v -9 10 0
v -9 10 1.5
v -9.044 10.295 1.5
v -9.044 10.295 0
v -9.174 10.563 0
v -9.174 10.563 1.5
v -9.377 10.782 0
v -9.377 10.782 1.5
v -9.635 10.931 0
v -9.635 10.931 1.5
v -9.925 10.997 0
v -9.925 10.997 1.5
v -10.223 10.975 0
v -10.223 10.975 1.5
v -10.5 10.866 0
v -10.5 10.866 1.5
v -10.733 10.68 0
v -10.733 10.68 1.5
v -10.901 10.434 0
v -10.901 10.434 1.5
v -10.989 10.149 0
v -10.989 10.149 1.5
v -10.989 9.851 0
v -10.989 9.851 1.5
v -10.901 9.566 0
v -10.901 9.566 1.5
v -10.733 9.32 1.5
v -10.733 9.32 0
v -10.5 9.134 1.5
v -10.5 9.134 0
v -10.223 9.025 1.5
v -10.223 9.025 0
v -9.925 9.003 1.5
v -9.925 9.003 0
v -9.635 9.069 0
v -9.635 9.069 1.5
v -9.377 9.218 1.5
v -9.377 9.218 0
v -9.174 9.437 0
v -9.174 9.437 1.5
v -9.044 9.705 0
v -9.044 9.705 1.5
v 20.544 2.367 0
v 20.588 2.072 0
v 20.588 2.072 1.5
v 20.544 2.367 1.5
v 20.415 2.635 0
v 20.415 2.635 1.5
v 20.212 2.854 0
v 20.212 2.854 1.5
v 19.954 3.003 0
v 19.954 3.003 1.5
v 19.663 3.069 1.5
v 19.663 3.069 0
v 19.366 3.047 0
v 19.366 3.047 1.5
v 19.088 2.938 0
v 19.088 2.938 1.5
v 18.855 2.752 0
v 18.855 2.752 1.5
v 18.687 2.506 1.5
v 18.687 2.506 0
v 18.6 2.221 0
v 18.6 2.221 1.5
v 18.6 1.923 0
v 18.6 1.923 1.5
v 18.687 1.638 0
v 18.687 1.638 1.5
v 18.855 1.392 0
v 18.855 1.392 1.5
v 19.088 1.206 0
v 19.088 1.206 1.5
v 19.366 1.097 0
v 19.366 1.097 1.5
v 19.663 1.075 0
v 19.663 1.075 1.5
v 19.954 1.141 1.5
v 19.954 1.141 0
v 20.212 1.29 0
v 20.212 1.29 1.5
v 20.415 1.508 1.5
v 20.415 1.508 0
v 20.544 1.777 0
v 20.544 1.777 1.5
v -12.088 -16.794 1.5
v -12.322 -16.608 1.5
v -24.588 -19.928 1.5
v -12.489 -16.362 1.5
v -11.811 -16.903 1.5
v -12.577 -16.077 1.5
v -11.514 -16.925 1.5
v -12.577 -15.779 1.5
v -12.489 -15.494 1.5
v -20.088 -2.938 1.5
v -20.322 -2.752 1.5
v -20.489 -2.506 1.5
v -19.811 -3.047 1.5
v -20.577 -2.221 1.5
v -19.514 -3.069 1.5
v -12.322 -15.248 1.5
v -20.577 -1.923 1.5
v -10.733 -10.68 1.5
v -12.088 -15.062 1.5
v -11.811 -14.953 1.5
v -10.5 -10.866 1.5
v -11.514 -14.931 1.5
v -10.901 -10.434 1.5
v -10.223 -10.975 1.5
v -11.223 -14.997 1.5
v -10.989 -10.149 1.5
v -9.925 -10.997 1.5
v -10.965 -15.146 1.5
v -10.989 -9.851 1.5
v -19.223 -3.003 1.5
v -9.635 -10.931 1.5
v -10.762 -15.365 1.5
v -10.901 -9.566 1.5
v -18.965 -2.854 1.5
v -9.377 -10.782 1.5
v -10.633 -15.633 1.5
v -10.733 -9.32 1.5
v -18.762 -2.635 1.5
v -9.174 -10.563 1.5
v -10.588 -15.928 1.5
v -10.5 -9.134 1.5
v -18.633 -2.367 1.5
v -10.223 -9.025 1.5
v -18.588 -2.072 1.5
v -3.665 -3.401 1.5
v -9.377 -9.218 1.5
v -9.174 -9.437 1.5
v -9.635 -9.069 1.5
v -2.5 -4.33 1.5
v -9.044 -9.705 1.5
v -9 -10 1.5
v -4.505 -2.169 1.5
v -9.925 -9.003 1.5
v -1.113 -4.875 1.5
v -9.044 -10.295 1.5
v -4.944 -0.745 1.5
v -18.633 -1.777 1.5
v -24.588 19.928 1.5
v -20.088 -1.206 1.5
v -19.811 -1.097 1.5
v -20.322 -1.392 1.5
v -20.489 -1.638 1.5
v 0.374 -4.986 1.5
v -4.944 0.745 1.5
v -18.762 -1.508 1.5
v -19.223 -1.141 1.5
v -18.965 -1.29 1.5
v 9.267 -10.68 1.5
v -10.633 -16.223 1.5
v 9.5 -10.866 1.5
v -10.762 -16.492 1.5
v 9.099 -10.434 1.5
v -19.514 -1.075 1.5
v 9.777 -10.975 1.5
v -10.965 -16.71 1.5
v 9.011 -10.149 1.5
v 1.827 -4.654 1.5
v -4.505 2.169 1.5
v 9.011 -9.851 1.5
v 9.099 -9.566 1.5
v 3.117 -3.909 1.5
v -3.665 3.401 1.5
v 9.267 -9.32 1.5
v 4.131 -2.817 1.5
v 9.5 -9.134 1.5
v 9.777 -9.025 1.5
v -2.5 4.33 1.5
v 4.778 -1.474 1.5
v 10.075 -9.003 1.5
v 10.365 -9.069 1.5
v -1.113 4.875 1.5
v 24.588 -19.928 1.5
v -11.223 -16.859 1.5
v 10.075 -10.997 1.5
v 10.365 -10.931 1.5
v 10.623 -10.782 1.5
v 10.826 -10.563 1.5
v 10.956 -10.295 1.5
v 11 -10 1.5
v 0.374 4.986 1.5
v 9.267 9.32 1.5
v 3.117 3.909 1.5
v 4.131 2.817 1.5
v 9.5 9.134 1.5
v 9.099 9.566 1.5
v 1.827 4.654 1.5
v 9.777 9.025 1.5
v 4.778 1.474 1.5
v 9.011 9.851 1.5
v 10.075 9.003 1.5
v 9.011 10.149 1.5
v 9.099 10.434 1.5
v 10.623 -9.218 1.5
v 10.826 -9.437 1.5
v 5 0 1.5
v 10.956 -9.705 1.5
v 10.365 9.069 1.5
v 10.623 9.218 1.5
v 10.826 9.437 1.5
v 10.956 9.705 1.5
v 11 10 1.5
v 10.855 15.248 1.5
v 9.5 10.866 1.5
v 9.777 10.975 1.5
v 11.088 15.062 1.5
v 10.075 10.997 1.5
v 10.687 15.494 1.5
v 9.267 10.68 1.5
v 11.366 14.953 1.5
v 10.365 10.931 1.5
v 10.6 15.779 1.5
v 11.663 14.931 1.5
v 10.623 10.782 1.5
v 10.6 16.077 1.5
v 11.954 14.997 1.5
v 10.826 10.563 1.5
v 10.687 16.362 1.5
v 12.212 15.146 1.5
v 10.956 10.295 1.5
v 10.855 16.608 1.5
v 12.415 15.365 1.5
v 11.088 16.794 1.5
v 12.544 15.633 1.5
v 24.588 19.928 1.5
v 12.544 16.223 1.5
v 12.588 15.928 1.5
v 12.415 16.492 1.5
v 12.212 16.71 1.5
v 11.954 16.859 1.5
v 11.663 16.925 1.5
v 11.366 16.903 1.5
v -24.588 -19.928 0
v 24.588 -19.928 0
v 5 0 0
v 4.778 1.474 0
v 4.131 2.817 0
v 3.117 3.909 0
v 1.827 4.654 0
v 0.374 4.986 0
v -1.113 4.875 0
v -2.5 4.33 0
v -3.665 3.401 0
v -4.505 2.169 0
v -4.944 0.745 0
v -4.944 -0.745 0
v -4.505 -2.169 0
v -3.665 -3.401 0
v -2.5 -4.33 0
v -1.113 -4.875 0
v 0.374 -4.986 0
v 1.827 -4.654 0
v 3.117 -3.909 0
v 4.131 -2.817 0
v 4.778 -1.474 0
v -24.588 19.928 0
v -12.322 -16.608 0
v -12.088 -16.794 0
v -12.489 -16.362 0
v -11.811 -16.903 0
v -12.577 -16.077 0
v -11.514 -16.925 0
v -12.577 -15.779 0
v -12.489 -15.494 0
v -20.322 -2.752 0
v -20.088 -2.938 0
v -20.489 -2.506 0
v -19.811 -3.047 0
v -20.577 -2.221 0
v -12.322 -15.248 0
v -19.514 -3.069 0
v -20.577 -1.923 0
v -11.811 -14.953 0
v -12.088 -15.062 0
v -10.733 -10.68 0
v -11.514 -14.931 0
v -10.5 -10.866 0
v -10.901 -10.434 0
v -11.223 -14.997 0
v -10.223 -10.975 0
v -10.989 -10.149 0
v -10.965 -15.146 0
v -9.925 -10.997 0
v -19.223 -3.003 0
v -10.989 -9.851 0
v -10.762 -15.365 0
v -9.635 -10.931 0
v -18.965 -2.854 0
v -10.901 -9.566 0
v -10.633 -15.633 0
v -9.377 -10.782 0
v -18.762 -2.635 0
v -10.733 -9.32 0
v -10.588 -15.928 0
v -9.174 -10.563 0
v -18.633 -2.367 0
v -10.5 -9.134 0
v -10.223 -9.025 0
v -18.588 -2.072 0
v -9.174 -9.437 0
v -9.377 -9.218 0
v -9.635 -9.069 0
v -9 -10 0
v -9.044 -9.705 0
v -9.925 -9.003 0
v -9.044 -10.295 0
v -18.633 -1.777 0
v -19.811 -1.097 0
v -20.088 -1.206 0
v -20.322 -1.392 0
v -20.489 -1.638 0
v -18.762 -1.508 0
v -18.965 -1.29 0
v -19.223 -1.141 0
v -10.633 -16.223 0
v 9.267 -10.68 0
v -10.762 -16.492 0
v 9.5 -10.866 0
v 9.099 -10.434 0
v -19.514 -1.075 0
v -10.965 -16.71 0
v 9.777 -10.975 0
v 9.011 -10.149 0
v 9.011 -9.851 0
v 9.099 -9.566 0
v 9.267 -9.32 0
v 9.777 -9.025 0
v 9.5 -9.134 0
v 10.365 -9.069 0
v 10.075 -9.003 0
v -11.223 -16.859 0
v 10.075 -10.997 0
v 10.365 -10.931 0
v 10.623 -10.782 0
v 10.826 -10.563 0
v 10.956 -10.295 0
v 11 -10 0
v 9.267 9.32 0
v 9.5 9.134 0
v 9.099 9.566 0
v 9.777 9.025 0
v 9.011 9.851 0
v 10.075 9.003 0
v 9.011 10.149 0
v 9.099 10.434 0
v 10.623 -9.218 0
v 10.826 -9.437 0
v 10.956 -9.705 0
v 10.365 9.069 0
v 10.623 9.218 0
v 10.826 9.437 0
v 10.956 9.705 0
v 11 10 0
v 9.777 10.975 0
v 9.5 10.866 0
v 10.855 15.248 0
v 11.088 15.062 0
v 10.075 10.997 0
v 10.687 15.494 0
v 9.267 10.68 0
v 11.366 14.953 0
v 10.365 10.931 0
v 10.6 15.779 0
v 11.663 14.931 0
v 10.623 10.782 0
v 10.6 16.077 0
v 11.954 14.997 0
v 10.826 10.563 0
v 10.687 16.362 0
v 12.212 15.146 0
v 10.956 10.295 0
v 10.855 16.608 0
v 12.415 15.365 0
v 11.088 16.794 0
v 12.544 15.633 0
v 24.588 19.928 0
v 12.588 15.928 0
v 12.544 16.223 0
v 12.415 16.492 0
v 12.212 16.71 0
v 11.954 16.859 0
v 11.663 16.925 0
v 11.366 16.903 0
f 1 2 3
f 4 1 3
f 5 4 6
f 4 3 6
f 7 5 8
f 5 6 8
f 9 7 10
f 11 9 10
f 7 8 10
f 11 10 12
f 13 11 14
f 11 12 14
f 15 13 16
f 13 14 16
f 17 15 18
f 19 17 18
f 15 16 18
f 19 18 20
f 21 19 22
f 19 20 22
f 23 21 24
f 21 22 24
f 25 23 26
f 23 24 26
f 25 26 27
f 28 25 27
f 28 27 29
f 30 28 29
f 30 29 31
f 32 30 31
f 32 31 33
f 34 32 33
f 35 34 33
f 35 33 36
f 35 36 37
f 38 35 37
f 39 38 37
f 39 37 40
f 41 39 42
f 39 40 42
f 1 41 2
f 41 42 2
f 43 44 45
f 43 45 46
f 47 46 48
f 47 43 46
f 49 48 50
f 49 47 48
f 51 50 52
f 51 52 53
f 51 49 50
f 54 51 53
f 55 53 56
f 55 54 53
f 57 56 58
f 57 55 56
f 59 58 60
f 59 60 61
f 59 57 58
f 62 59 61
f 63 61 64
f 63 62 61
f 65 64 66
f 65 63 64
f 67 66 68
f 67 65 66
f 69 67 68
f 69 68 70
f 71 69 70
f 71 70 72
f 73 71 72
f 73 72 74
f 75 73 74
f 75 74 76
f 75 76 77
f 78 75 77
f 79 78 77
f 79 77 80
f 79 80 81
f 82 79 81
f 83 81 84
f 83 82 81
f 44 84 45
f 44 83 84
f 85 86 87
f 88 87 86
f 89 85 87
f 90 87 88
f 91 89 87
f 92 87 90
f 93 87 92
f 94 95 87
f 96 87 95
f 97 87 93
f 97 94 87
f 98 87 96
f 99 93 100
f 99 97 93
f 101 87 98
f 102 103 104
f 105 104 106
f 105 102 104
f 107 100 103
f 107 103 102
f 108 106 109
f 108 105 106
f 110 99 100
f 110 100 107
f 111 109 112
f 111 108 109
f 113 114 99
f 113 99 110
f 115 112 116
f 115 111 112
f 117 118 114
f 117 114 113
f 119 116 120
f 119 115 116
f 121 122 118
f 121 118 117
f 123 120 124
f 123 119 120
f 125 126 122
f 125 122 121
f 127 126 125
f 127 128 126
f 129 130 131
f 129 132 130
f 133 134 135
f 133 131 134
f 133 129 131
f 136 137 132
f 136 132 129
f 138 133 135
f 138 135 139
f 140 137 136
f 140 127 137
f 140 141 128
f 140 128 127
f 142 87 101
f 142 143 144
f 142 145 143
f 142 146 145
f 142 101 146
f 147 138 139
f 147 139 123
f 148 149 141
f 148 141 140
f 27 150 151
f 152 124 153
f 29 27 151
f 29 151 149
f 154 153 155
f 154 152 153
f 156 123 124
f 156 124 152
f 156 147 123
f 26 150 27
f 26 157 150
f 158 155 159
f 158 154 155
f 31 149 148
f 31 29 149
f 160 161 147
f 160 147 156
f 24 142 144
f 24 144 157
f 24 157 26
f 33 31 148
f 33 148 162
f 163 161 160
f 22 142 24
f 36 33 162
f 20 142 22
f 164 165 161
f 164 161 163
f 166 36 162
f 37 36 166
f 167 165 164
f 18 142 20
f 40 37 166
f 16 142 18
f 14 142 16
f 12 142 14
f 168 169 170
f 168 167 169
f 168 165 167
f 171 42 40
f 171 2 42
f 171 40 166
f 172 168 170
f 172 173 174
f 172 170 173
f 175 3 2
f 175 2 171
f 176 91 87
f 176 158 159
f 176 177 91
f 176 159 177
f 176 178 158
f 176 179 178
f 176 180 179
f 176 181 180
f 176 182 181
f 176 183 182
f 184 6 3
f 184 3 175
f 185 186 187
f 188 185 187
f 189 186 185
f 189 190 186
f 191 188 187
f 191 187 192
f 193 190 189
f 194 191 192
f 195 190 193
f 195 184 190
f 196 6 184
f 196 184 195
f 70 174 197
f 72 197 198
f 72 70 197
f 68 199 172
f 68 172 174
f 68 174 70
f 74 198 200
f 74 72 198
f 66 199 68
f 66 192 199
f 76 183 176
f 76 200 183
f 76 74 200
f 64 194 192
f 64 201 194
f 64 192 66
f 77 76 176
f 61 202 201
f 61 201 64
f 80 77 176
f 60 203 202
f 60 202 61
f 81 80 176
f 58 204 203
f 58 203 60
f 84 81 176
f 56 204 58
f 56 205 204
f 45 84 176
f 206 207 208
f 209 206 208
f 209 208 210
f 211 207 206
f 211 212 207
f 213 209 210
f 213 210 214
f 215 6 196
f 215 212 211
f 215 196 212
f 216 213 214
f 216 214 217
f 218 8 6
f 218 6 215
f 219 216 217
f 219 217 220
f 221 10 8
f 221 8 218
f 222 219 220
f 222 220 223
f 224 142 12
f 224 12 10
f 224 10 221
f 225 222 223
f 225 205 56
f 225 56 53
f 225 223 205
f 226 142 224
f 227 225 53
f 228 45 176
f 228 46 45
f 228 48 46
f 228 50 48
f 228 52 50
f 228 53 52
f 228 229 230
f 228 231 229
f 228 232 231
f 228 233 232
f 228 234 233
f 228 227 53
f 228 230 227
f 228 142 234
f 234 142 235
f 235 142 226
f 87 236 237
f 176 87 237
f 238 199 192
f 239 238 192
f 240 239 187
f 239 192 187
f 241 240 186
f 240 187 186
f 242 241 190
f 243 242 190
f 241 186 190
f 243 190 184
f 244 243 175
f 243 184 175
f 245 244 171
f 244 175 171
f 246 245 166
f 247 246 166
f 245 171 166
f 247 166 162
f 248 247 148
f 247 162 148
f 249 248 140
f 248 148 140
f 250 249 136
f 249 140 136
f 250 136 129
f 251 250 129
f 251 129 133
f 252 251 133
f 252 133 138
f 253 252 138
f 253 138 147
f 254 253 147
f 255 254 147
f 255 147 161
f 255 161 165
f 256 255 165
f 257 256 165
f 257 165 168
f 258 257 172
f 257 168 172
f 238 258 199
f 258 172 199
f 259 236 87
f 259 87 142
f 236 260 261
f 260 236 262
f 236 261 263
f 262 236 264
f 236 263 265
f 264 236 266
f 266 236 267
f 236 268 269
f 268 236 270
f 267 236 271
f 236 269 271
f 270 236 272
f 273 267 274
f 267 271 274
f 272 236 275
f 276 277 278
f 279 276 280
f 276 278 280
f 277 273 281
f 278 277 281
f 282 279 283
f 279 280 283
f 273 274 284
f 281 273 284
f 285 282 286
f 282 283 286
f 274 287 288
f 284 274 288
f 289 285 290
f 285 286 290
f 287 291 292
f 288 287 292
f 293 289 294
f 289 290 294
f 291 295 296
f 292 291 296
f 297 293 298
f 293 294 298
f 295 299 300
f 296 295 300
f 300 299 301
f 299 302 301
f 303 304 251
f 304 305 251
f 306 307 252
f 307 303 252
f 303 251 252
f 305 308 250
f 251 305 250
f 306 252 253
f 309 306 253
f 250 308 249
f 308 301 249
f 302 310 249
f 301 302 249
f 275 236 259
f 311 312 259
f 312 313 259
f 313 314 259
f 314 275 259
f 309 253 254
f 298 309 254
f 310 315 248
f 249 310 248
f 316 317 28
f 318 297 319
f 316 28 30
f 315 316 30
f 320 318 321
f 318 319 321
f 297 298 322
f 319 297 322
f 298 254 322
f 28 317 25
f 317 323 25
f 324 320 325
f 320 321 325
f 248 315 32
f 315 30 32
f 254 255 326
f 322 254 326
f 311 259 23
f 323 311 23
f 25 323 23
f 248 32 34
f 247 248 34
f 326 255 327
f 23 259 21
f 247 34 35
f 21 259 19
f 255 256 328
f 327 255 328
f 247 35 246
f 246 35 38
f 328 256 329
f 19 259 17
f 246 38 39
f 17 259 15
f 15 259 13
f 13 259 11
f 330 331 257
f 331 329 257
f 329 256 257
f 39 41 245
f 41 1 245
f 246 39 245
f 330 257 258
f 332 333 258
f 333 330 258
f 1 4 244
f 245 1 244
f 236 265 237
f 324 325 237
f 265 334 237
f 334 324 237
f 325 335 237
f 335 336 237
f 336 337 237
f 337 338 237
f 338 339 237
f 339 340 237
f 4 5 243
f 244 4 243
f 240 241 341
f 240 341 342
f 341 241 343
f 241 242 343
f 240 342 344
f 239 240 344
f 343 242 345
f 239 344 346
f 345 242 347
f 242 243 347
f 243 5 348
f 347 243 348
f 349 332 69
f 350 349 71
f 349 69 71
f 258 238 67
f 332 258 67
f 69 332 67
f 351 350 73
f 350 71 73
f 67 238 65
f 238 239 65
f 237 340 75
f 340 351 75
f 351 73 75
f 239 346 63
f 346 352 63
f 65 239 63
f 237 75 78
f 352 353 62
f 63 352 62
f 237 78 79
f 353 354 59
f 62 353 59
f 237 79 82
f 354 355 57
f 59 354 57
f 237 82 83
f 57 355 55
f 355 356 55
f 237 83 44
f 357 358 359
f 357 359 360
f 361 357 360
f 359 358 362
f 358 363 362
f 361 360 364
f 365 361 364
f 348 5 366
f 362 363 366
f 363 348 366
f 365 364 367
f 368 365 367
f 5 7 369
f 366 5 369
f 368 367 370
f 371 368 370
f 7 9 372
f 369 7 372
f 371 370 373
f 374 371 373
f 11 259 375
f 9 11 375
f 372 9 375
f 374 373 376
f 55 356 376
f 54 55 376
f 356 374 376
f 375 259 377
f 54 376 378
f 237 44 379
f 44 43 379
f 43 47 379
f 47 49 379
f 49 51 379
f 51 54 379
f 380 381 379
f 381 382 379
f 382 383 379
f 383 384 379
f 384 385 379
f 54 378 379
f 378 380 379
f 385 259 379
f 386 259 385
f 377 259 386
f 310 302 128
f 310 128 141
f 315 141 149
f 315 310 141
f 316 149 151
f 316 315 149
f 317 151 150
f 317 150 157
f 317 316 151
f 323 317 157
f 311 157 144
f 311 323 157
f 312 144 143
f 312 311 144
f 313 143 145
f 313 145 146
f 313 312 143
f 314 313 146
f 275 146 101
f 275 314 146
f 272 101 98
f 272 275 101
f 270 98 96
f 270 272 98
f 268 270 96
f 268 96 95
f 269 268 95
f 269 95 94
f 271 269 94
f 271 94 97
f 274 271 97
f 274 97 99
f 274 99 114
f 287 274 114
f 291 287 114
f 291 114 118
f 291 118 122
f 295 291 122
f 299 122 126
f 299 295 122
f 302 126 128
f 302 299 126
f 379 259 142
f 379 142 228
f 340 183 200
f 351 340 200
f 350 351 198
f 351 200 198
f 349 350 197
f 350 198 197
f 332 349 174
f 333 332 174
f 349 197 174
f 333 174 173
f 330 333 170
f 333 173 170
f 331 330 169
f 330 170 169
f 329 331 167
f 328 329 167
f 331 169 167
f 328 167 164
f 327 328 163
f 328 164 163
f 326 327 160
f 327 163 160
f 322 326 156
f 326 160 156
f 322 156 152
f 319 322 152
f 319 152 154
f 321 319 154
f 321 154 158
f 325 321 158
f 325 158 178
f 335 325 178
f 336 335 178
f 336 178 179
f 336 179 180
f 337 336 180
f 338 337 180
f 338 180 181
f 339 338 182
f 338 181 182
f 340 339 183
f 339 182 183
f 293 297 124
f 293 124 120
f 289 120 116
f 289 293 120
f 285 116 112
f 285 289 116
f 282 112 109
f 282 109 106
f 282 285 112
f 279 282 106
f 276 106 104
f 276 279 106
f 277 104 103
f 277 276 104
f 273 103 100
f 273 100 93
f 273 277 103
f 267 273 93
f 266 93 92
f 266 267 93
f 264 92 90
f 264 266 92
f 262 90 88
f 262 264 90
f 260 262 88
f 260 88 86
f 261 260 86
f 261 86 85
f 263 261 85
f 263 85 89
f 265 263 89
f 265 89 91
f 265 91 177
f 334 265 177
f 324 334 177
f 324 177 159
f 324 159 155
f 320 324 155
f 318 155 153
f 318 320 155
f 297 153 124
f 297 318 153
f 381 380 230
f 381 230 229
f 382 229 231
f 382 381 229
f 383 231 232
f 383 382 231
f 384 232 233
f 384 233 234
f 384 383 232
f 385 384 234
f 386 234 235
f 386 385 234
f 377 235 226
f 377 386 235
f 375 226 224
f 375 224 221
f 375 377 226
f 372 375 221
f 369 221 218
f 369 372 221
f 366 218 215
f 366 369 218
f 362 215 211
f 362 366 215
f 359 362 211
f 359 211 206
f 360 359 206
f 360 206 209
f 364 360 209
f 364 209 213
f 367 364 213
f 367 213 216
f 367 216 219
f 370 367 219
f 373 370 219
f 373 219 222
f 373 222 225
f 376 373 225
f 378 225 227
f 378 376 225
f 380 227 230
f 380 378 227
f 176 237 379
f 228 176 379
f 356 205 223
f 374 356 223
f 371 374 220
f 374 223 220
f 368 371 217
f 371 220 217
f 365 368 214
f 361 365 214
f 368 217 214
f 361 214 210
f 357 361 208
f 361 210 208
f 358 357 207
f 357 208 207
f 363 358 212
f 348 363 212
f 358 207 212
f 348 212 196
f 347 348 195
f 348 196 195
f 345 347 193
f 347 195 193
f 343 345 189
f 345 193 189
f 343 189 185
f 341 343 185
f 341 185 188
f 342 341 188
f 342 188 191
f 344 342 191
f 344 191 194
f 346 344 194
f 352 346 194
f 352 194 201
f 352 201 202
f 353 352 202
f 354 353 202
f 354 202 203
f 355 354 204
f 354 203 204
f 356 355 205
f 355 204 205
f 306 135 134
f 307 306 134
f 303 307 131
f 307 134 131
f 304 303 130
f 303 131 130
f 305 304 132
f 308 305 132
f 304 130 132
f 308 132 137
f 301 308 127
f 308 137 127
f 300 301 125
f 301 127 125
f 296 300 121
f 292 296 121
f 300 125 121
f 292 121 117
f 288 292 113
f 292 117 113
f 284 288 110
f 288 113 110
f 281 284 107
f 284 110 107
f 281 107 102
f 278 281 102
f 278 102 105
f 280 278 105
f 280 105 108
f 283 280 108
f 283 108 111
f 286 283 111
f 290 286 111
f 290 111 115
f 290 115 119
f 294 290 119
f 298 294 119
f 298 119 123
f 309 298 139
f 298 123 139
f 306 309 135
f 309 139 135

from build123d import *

# Parameters (mm, degrees)
F0_W     = 49.176914
F0_H     = 39.856406
F0_R     = 1
F1_DEPTH = 1.5
F2_R     = 1
F2_R_2   = 5
F3_DEPTH = 1.5


with BuildPart() as f1:
    # F0 (on Top) → F1 (new body)
    with BuildSketch(Plane.XY):
        Rectangle(F0_W, F0_H)
        with Locations((-11.588457, -15.928203)):
            Circle(F0_R, mode=Mode.SUBTRACT)
        with Locations((-19.588457, -2.071797)):
            Circle(F0_R, mode=Mode.SUBTRACT)
        with Locations((19.588457, 2.071797)):
            Circle(F0_R, mode=Mode.SUBTRACT)
        with Locations((11.588457, 15.928203)):
            Circle(F0_R, mode=Mode.SUBTRACT)
    extrude(amount=F1_DEPTH)

    # F2 (on face) → F3 (cut, through all)
    with BuildSketch(Plane.XY.offset(1.5)):
        with Locations((-10, 10)):
            Circle(F2_R)
        with Locations((10, 10)):
            Circle(F2_R)
        with Locations((-10, -10)):
            Circle(F2_R)
        with Locations((10, -10)):
            Circle(F2_R)
        Circle(F2_R_2)
    extrude(amount=-F3_DEPTH, mode=Mode.SUBTRACT)


solid = f1.part
